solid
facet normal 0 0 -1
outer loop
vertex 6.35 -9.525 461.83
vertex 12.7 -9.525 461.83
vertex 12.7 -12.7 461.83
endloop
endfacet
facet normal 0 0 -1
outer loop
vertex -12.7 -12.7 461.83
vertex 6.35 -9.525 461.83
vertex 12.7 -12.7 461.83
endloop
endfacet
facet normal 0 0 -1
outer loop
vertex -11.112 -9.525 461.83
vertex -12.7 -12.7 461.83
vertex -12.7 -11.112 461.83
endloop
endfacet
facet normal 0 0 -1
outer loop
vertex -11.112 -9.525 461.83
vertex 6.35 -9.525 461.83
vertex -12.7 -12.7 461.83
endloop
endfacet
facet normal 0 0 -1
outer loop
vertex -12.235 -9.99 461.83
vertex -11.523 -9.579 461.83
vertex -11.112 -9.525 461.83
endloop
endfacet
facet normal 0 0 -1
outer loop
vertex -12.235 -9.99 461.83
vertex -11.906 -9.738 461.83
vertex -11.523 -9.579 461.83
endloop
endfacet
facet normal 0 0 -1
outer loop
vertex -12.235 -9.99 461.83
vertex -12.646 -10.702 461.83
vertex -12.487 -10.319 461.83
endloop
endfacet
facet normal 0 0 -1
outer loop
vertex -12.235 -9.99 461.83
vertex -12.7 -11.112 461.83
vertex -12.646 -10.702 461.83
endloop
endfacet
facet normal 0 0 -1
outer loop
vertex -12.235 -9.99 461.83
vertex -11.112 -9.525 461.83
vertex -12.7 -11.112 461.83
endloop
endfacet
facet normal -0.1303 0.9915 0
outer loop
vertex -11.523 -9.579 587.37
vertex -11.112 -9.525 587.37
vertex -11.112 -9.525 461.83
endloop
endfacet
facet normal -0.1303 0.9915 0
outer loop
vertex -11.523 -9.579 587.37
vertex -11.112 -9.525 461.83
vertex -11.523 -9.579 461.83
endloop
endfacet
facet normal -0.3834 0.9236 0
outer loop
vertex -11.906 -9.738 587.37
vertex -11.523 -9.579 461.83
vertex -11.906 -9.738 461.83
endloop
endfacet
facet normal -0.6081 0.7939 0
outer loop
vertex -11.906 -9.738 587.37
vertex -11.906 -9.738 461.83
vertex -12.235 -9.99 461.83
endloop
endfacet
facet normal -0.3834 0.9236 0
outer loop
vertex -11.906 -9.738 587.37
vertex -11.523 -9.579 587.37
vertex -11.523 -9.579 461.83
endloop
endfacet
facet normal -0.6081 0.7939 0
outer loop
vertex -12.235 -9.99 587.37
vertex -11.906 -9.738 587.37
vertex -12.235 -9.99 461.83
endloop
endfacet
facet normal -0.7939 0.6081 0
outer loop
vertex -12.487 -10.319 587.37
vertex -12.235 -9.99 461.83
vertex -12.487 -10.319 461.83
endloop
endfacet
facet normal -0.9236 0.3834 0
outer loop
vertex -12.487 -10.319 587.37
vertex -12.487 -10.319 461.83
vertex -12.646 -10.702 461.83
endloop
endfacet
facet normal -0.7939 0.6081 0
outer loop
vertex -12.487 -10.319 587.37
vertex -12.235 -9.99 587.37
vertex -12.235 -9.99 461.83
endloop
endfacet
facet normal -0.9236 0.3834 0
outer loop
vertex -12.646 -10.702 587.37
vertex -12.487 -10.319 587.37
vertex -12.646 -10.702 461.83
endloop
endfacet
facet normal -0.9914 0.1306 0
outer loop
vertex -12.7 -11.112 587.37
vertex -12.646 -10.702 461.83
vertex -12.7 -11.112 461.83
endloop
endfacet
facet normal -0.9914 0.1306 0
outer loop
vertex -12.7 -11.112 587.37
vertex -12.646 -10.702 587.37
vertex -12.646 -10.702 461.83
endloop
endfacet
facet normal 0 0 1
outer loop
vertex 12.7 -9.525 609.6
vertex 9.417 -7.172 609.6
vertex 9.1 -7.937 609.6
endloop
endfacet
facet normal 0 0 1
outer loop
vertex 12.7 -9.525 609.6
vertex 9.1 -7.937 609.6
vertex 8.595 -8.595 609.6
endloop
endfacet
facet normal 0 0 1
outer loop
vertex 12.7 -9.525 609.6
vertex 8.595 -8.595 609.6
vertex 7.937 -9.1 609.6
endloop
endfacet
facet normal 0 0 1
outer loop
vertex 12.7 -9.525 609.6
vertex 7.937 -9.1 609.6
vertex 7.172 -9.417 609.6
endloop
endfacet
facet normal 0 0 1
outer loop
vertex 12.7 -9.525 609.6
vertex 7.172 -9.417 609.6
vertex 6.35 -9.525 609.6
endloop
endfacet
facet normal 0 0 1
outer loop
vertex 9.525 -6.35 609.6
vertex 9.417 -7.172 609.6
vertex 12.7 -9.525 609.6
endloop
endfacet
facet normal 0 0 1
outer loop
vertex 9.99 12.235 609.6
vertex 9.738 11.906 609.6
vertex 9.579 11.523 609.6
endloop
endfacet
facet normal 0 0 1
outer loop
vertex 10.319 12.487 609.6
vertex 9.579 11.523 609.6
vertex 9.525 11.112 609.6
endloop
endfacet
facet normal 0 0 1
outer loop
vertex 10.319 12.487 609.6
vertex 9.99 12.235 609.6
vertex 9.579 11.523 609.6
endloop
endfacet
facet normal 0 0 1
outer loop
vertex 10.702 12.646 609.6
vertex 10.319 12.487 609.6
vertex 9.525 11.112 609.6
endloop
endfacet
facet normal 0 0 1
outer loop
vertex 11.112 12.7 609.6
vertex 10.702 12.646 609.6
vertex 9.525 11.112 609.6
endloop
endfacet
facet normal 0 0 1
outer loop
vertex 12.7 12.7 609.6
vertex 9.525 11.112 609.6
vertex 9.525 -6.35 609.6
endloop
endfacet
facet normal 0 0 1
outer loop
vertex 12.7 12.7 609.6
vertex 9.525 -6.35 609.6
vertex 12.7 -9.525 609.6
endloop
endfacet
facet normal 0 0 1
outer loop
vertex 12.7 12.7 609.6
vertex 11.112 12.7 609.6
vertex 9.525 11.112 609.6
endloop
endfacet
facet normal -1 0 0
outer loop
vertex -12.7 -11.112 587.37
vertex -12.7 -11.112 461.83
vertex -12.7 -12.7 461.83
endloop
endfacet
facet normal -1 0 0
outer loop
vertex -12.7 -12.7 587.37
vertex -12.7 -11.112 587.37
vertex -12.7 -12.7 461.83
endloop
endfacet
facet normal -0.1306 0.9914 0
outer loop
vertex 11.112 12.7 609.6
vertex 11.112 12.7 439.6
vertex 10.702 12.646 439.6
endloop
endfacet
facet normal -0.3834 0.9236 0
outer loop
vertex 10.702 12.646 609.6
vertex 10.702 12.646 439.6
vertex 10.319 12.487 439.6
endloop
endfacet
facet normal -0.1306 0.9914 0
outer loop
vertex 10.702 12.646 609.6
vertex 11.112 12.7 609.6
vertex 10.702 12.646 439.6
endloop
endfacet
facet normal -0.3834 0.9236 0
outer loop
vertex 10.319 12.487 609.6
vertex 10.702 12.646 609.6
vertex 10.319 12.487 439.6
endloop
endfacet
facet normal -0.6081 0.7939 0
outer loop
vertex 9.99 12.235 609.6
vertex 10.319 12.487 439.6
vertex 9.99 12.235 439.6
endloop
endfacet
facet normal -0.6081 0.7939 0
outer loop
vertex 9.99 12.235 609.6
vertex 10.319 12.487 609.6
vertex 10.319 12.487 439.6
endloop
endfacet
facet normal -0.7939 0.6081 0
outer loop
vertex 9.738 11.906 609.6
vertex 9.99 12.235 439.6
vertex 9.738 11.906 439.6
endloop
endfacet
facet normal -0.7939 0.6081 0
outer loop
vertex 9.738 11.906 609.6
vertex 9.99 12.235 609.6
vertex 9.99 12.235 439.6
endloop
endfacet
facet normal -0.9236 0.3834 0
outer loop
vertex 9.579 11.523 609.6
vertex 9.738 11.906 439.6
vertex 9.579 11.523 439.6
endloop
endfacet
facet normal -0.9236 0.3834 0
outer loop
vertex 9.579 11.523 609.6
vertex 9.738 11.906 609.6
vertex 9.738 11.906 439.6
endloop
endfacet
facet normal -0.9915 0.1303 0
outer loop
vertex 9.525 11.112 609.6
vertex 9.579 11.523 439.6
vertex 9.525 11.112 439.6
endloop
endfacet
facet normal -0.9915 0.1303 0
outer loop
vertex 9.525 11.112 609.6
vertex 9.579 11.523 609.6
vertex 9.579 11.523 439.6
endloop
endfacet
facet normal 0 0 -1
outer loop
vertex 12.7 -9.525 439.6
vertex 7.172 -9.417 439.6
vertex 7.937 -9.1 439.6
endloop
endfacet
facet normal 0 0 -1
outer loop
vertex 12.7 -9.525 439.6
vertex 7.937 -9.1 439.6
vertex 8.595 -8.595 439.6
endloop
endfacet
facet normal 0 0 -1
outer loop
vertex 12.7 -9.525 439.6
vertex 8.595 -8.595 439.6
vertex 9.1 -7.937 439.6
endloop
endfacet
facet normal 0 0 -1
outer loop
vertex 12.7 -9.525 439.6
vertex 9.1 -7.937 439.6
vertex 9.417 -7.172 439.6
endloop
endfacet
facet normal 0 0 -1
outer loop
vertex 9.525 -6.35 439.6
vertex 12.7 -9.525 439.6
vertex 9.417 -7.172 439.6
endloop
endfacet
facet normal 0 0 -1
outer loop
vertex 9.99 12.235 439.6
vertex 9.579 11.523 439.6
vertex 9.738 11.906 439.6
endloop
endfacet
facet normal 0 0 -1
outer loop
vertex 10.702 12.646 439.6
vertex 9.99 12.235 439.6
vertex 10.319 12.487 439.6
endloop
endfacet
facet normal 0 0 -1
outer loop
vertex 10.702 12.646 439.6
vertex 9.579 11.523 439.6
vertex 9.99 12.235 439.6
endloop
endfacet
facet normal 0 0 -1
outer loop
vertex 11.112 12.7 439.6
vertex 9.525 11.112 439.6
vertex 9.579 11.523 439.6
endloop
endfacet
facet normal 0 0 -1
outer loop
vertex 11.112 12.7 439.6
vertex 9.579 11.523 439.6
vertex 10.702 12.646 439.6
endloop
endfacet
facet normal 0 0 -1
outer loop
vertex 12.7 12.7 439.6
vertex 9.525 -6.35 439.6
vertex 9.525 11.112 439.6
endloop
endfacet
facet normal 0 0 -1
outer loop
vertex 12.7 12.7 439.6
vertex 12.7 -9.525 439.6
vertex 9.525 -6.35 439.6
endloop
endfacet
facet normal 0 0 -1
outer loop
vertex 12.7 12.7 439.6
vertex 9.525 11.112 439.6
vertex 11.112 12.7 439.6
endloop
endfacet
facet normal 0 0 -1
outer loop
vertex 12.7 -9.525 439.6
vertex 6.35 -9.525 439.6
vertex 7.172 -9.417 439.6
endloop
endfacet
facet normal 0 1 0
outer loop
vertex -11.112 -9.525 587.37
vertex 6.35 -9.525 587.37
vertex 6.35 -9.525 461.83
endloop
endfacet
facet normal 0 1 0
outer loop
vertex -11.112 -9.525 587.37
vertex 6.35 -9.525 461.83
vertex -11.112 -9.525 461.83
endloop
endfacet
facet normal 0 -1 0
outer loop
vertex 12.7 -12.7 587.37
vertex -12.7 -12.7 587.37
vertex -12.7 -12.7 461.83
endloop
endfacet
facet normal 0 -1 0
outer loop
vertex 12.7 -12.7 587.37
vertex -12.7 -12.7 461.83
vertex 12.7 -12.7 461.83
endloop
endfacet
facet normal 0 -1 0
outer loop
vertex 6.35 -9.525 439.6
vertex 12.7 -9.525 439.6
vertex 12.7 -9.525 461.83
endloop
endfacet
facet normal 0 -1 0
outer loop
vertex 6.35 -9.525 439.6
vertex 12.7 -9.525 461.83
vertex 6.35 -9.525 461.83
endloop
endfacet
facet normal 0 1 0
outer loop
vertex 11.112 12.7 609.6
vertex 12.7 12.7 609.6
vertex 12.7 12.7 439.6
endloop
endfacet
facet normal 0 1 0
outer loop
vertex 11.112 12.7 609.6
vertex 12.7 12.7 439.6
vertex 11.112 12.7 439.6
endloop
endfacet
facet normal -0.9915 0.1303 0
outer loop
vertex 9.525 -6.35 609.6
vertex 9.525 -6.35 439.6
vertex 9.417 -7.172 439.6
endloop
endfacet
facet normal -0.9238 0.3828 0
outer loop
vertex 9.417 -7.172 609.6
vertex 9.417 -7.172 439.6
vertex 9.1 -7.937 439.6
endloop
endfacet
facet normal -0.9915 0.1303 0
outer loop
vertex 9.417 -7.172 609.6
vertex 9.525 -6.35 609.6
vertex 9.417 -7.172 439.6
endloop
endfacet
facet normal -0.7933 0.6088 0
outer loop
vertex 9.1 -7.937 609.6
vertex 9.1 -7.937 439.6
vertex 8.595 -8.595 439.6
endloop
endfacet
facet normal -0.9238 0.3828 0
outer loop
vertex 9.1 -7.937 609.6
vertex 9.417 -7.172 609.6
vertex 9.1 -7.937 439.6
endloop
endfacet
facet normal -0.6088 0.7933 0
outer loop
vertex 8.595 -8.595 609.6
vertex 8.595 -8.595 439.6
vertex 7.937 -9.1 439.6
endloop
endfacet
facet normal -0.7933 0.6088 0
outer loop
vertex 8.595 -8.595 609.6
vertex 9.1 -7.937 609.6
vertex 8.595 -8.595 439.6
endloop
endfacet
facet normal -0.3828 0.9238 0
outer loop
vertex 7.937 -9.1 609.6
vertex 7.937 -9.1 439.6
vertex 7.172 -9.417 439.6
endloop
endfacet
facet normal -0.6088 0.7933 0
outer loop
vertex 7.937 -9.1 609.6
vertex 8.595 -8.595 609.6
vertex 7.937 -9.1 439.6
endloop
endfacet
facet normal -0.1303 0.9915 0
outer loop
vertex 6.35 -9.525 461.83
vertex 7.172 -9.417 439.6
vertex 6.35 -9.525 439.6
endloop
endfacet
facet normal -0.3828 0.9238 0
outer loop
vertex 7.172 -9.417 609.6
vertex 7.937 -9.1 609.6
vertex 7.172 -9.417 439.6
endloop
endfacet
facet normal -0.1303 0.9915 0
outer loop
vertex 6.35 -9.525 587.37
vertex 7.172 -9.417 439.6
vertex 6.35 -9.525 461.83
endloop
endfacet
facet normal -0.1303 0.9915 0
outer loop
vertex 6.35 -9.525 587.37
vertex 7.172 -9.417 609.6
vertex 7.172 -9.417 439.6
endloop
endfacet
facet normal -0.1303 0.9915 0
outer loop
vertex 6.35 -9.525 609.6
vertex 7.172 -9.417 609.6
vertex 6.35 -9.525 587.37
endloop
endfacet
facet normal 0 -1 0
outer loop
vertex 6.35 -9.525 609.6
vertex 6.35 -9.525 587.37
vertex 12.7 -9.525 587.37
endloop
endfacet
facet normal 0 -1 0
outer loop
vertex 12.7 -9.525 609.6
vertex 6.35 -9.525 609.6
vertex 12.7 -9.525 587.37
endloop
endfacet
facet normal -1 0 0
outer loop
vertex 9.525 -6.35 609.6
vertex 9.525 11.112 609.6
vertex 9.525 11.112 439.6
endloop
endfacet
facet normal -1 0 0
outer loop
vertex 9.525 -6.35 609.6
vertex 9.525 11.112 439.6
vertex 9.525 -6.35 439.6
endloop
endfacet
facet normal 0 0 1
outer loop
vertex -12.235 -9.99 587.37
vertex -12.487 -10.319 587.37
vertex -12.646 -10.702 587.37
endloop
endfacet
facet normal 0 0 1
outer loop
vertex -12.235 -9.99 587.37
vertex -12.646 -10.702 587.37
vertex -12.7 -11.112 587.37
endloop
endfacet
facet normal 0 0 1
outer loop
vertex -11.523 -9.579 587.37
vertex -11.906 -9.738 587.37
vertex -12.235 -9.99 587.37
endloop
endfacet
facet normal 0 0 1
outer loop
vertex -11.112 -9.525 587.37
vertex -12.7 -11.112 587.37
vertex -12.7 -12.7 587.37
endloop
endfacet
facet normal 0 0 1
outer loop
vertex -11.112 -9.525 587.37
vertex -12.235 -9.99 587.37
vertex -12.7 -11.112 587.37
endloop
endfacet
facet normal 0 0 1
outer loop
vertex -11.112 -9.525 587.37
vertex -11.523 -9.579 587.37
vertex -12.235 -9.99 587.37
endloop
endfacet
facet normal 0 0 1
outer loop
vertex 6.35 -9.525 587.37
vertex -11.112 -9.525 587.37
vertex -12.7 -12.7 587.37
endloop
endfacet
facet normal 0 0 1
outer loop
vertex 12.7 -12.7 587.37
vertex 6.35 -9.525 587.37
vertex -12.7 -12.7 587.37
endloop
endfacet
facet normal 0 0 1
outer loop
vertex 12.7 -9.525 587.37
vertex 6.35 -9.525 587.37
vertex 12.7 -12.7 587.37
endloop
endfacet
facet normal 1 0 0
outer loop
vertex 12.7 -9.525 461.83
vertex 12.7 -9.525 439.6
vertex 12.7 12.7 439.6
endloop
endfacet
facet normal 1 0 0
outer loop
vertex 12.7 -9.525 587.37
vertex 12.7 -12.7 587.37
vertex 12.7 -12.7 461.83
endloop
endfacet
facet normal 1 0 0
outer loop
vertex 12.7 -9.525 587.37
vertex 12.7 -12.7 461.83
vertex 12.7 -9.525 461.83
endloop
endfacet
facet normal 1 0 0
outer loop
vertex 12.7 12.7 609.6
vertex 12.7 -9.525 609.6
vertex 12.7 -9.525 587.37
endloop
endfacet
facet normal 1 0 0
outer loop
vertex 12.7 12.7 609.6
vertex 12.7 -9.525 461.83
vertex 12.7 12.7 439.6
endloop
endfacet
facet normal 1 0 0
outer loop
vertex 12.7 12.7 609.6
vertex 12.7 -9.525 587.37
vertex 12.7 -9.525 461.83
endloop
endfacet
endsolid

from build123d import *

# Parameters (mm, degrees)
BOSS_EXTRUDE1_DEPTH = 609.6
SKETCH3_W           = 1049.2
SKETCH3_H           = 25.4
CUT_EXTRUDE2_DEPTH  = 30.48
SKETCH6_W           = 25.4
SKETCH6_H           = 3.175
CUT_EXTRUDE4_DEPTH  = 22.23
SKETCH7_W           = 25.4
SKETCH7_H           = 3.175
CUT_EXTRUDE5_DEPTH  = 22.23


with BuildPart() as part:
    # Sketch2 → Boss-Extrude1 (new, symmetric)
    with BuildSketch(Plane.XY):
        with BuildLine():
            Line((-12.7, -12.7), (12.7, -12.7))
            Line((12.7, -12.7), (12.7, 12.7))
            Line((12.7, 12.7), (11.1125, 12.7))
            ThreePointArc((11.1125, 12.7), (9.989967985, 12.235032015), (9.525, 11.1125))
            Line((9.525, 11.1125), (9.525, -6.35))
            ThreePointArc((9.525, -6.35), (8.59506403, -8.59506403), (6.35, -9.525))
            Line((6.35, -9.525), (-11.1125, -9.525))
            ThreePointArc((-11.1125, -9.525), (-12.235032015, -9.989967985), (-12.7, -11.1125))
            Line((-12.7, -11.1125), (-12.7, -12.7))
        make_face()
    extrude(amount=BOSS_EXTRUDE1_DEPTH, both=True)

    # Sketch3 → Cut-Extrude2 (cut)
    with BuildSketch(Plane(origin=(12.7, 0, 0), x_dir=(0, 0, -1), z_dir=(1, 0, 0))):
        with Locations((85, 0)):
            Rectangle(SKETCH3_W, SKETCH3_H)
    extrude(amount=-CUT_EXTRUDE2_DEPTH, mode=Mode.SUBTRACT)

    # Sketch6 → Cut-Extrude4 (cut)
    with BuildSketch(Plane(origin=(0, 0, 439.6), x_dir=(-1, 0, 0), z_dir=(0, 0, -1))):
        with Locations((0, -11.1125)):
            Rectangle(SKETCH6_W, SKETCH6_H)
    extrude(amount=-CUT_EXTRUDE4_DEPTH, mode=Mode.SUBTRACT)

    # Sketch7 → Cut-Extrude5 (cut)
    with BuildSketch(Plane.XY.offset(609.6)):
        with Locations((0, -11.1125)):
            Rectangle(SKETCH7_W, SKETCH7_H)
    extrude(amount=-CUT_EXTRUDE5_DEPTH, mode=Mode.SUBTRACT)


solid = part.part
